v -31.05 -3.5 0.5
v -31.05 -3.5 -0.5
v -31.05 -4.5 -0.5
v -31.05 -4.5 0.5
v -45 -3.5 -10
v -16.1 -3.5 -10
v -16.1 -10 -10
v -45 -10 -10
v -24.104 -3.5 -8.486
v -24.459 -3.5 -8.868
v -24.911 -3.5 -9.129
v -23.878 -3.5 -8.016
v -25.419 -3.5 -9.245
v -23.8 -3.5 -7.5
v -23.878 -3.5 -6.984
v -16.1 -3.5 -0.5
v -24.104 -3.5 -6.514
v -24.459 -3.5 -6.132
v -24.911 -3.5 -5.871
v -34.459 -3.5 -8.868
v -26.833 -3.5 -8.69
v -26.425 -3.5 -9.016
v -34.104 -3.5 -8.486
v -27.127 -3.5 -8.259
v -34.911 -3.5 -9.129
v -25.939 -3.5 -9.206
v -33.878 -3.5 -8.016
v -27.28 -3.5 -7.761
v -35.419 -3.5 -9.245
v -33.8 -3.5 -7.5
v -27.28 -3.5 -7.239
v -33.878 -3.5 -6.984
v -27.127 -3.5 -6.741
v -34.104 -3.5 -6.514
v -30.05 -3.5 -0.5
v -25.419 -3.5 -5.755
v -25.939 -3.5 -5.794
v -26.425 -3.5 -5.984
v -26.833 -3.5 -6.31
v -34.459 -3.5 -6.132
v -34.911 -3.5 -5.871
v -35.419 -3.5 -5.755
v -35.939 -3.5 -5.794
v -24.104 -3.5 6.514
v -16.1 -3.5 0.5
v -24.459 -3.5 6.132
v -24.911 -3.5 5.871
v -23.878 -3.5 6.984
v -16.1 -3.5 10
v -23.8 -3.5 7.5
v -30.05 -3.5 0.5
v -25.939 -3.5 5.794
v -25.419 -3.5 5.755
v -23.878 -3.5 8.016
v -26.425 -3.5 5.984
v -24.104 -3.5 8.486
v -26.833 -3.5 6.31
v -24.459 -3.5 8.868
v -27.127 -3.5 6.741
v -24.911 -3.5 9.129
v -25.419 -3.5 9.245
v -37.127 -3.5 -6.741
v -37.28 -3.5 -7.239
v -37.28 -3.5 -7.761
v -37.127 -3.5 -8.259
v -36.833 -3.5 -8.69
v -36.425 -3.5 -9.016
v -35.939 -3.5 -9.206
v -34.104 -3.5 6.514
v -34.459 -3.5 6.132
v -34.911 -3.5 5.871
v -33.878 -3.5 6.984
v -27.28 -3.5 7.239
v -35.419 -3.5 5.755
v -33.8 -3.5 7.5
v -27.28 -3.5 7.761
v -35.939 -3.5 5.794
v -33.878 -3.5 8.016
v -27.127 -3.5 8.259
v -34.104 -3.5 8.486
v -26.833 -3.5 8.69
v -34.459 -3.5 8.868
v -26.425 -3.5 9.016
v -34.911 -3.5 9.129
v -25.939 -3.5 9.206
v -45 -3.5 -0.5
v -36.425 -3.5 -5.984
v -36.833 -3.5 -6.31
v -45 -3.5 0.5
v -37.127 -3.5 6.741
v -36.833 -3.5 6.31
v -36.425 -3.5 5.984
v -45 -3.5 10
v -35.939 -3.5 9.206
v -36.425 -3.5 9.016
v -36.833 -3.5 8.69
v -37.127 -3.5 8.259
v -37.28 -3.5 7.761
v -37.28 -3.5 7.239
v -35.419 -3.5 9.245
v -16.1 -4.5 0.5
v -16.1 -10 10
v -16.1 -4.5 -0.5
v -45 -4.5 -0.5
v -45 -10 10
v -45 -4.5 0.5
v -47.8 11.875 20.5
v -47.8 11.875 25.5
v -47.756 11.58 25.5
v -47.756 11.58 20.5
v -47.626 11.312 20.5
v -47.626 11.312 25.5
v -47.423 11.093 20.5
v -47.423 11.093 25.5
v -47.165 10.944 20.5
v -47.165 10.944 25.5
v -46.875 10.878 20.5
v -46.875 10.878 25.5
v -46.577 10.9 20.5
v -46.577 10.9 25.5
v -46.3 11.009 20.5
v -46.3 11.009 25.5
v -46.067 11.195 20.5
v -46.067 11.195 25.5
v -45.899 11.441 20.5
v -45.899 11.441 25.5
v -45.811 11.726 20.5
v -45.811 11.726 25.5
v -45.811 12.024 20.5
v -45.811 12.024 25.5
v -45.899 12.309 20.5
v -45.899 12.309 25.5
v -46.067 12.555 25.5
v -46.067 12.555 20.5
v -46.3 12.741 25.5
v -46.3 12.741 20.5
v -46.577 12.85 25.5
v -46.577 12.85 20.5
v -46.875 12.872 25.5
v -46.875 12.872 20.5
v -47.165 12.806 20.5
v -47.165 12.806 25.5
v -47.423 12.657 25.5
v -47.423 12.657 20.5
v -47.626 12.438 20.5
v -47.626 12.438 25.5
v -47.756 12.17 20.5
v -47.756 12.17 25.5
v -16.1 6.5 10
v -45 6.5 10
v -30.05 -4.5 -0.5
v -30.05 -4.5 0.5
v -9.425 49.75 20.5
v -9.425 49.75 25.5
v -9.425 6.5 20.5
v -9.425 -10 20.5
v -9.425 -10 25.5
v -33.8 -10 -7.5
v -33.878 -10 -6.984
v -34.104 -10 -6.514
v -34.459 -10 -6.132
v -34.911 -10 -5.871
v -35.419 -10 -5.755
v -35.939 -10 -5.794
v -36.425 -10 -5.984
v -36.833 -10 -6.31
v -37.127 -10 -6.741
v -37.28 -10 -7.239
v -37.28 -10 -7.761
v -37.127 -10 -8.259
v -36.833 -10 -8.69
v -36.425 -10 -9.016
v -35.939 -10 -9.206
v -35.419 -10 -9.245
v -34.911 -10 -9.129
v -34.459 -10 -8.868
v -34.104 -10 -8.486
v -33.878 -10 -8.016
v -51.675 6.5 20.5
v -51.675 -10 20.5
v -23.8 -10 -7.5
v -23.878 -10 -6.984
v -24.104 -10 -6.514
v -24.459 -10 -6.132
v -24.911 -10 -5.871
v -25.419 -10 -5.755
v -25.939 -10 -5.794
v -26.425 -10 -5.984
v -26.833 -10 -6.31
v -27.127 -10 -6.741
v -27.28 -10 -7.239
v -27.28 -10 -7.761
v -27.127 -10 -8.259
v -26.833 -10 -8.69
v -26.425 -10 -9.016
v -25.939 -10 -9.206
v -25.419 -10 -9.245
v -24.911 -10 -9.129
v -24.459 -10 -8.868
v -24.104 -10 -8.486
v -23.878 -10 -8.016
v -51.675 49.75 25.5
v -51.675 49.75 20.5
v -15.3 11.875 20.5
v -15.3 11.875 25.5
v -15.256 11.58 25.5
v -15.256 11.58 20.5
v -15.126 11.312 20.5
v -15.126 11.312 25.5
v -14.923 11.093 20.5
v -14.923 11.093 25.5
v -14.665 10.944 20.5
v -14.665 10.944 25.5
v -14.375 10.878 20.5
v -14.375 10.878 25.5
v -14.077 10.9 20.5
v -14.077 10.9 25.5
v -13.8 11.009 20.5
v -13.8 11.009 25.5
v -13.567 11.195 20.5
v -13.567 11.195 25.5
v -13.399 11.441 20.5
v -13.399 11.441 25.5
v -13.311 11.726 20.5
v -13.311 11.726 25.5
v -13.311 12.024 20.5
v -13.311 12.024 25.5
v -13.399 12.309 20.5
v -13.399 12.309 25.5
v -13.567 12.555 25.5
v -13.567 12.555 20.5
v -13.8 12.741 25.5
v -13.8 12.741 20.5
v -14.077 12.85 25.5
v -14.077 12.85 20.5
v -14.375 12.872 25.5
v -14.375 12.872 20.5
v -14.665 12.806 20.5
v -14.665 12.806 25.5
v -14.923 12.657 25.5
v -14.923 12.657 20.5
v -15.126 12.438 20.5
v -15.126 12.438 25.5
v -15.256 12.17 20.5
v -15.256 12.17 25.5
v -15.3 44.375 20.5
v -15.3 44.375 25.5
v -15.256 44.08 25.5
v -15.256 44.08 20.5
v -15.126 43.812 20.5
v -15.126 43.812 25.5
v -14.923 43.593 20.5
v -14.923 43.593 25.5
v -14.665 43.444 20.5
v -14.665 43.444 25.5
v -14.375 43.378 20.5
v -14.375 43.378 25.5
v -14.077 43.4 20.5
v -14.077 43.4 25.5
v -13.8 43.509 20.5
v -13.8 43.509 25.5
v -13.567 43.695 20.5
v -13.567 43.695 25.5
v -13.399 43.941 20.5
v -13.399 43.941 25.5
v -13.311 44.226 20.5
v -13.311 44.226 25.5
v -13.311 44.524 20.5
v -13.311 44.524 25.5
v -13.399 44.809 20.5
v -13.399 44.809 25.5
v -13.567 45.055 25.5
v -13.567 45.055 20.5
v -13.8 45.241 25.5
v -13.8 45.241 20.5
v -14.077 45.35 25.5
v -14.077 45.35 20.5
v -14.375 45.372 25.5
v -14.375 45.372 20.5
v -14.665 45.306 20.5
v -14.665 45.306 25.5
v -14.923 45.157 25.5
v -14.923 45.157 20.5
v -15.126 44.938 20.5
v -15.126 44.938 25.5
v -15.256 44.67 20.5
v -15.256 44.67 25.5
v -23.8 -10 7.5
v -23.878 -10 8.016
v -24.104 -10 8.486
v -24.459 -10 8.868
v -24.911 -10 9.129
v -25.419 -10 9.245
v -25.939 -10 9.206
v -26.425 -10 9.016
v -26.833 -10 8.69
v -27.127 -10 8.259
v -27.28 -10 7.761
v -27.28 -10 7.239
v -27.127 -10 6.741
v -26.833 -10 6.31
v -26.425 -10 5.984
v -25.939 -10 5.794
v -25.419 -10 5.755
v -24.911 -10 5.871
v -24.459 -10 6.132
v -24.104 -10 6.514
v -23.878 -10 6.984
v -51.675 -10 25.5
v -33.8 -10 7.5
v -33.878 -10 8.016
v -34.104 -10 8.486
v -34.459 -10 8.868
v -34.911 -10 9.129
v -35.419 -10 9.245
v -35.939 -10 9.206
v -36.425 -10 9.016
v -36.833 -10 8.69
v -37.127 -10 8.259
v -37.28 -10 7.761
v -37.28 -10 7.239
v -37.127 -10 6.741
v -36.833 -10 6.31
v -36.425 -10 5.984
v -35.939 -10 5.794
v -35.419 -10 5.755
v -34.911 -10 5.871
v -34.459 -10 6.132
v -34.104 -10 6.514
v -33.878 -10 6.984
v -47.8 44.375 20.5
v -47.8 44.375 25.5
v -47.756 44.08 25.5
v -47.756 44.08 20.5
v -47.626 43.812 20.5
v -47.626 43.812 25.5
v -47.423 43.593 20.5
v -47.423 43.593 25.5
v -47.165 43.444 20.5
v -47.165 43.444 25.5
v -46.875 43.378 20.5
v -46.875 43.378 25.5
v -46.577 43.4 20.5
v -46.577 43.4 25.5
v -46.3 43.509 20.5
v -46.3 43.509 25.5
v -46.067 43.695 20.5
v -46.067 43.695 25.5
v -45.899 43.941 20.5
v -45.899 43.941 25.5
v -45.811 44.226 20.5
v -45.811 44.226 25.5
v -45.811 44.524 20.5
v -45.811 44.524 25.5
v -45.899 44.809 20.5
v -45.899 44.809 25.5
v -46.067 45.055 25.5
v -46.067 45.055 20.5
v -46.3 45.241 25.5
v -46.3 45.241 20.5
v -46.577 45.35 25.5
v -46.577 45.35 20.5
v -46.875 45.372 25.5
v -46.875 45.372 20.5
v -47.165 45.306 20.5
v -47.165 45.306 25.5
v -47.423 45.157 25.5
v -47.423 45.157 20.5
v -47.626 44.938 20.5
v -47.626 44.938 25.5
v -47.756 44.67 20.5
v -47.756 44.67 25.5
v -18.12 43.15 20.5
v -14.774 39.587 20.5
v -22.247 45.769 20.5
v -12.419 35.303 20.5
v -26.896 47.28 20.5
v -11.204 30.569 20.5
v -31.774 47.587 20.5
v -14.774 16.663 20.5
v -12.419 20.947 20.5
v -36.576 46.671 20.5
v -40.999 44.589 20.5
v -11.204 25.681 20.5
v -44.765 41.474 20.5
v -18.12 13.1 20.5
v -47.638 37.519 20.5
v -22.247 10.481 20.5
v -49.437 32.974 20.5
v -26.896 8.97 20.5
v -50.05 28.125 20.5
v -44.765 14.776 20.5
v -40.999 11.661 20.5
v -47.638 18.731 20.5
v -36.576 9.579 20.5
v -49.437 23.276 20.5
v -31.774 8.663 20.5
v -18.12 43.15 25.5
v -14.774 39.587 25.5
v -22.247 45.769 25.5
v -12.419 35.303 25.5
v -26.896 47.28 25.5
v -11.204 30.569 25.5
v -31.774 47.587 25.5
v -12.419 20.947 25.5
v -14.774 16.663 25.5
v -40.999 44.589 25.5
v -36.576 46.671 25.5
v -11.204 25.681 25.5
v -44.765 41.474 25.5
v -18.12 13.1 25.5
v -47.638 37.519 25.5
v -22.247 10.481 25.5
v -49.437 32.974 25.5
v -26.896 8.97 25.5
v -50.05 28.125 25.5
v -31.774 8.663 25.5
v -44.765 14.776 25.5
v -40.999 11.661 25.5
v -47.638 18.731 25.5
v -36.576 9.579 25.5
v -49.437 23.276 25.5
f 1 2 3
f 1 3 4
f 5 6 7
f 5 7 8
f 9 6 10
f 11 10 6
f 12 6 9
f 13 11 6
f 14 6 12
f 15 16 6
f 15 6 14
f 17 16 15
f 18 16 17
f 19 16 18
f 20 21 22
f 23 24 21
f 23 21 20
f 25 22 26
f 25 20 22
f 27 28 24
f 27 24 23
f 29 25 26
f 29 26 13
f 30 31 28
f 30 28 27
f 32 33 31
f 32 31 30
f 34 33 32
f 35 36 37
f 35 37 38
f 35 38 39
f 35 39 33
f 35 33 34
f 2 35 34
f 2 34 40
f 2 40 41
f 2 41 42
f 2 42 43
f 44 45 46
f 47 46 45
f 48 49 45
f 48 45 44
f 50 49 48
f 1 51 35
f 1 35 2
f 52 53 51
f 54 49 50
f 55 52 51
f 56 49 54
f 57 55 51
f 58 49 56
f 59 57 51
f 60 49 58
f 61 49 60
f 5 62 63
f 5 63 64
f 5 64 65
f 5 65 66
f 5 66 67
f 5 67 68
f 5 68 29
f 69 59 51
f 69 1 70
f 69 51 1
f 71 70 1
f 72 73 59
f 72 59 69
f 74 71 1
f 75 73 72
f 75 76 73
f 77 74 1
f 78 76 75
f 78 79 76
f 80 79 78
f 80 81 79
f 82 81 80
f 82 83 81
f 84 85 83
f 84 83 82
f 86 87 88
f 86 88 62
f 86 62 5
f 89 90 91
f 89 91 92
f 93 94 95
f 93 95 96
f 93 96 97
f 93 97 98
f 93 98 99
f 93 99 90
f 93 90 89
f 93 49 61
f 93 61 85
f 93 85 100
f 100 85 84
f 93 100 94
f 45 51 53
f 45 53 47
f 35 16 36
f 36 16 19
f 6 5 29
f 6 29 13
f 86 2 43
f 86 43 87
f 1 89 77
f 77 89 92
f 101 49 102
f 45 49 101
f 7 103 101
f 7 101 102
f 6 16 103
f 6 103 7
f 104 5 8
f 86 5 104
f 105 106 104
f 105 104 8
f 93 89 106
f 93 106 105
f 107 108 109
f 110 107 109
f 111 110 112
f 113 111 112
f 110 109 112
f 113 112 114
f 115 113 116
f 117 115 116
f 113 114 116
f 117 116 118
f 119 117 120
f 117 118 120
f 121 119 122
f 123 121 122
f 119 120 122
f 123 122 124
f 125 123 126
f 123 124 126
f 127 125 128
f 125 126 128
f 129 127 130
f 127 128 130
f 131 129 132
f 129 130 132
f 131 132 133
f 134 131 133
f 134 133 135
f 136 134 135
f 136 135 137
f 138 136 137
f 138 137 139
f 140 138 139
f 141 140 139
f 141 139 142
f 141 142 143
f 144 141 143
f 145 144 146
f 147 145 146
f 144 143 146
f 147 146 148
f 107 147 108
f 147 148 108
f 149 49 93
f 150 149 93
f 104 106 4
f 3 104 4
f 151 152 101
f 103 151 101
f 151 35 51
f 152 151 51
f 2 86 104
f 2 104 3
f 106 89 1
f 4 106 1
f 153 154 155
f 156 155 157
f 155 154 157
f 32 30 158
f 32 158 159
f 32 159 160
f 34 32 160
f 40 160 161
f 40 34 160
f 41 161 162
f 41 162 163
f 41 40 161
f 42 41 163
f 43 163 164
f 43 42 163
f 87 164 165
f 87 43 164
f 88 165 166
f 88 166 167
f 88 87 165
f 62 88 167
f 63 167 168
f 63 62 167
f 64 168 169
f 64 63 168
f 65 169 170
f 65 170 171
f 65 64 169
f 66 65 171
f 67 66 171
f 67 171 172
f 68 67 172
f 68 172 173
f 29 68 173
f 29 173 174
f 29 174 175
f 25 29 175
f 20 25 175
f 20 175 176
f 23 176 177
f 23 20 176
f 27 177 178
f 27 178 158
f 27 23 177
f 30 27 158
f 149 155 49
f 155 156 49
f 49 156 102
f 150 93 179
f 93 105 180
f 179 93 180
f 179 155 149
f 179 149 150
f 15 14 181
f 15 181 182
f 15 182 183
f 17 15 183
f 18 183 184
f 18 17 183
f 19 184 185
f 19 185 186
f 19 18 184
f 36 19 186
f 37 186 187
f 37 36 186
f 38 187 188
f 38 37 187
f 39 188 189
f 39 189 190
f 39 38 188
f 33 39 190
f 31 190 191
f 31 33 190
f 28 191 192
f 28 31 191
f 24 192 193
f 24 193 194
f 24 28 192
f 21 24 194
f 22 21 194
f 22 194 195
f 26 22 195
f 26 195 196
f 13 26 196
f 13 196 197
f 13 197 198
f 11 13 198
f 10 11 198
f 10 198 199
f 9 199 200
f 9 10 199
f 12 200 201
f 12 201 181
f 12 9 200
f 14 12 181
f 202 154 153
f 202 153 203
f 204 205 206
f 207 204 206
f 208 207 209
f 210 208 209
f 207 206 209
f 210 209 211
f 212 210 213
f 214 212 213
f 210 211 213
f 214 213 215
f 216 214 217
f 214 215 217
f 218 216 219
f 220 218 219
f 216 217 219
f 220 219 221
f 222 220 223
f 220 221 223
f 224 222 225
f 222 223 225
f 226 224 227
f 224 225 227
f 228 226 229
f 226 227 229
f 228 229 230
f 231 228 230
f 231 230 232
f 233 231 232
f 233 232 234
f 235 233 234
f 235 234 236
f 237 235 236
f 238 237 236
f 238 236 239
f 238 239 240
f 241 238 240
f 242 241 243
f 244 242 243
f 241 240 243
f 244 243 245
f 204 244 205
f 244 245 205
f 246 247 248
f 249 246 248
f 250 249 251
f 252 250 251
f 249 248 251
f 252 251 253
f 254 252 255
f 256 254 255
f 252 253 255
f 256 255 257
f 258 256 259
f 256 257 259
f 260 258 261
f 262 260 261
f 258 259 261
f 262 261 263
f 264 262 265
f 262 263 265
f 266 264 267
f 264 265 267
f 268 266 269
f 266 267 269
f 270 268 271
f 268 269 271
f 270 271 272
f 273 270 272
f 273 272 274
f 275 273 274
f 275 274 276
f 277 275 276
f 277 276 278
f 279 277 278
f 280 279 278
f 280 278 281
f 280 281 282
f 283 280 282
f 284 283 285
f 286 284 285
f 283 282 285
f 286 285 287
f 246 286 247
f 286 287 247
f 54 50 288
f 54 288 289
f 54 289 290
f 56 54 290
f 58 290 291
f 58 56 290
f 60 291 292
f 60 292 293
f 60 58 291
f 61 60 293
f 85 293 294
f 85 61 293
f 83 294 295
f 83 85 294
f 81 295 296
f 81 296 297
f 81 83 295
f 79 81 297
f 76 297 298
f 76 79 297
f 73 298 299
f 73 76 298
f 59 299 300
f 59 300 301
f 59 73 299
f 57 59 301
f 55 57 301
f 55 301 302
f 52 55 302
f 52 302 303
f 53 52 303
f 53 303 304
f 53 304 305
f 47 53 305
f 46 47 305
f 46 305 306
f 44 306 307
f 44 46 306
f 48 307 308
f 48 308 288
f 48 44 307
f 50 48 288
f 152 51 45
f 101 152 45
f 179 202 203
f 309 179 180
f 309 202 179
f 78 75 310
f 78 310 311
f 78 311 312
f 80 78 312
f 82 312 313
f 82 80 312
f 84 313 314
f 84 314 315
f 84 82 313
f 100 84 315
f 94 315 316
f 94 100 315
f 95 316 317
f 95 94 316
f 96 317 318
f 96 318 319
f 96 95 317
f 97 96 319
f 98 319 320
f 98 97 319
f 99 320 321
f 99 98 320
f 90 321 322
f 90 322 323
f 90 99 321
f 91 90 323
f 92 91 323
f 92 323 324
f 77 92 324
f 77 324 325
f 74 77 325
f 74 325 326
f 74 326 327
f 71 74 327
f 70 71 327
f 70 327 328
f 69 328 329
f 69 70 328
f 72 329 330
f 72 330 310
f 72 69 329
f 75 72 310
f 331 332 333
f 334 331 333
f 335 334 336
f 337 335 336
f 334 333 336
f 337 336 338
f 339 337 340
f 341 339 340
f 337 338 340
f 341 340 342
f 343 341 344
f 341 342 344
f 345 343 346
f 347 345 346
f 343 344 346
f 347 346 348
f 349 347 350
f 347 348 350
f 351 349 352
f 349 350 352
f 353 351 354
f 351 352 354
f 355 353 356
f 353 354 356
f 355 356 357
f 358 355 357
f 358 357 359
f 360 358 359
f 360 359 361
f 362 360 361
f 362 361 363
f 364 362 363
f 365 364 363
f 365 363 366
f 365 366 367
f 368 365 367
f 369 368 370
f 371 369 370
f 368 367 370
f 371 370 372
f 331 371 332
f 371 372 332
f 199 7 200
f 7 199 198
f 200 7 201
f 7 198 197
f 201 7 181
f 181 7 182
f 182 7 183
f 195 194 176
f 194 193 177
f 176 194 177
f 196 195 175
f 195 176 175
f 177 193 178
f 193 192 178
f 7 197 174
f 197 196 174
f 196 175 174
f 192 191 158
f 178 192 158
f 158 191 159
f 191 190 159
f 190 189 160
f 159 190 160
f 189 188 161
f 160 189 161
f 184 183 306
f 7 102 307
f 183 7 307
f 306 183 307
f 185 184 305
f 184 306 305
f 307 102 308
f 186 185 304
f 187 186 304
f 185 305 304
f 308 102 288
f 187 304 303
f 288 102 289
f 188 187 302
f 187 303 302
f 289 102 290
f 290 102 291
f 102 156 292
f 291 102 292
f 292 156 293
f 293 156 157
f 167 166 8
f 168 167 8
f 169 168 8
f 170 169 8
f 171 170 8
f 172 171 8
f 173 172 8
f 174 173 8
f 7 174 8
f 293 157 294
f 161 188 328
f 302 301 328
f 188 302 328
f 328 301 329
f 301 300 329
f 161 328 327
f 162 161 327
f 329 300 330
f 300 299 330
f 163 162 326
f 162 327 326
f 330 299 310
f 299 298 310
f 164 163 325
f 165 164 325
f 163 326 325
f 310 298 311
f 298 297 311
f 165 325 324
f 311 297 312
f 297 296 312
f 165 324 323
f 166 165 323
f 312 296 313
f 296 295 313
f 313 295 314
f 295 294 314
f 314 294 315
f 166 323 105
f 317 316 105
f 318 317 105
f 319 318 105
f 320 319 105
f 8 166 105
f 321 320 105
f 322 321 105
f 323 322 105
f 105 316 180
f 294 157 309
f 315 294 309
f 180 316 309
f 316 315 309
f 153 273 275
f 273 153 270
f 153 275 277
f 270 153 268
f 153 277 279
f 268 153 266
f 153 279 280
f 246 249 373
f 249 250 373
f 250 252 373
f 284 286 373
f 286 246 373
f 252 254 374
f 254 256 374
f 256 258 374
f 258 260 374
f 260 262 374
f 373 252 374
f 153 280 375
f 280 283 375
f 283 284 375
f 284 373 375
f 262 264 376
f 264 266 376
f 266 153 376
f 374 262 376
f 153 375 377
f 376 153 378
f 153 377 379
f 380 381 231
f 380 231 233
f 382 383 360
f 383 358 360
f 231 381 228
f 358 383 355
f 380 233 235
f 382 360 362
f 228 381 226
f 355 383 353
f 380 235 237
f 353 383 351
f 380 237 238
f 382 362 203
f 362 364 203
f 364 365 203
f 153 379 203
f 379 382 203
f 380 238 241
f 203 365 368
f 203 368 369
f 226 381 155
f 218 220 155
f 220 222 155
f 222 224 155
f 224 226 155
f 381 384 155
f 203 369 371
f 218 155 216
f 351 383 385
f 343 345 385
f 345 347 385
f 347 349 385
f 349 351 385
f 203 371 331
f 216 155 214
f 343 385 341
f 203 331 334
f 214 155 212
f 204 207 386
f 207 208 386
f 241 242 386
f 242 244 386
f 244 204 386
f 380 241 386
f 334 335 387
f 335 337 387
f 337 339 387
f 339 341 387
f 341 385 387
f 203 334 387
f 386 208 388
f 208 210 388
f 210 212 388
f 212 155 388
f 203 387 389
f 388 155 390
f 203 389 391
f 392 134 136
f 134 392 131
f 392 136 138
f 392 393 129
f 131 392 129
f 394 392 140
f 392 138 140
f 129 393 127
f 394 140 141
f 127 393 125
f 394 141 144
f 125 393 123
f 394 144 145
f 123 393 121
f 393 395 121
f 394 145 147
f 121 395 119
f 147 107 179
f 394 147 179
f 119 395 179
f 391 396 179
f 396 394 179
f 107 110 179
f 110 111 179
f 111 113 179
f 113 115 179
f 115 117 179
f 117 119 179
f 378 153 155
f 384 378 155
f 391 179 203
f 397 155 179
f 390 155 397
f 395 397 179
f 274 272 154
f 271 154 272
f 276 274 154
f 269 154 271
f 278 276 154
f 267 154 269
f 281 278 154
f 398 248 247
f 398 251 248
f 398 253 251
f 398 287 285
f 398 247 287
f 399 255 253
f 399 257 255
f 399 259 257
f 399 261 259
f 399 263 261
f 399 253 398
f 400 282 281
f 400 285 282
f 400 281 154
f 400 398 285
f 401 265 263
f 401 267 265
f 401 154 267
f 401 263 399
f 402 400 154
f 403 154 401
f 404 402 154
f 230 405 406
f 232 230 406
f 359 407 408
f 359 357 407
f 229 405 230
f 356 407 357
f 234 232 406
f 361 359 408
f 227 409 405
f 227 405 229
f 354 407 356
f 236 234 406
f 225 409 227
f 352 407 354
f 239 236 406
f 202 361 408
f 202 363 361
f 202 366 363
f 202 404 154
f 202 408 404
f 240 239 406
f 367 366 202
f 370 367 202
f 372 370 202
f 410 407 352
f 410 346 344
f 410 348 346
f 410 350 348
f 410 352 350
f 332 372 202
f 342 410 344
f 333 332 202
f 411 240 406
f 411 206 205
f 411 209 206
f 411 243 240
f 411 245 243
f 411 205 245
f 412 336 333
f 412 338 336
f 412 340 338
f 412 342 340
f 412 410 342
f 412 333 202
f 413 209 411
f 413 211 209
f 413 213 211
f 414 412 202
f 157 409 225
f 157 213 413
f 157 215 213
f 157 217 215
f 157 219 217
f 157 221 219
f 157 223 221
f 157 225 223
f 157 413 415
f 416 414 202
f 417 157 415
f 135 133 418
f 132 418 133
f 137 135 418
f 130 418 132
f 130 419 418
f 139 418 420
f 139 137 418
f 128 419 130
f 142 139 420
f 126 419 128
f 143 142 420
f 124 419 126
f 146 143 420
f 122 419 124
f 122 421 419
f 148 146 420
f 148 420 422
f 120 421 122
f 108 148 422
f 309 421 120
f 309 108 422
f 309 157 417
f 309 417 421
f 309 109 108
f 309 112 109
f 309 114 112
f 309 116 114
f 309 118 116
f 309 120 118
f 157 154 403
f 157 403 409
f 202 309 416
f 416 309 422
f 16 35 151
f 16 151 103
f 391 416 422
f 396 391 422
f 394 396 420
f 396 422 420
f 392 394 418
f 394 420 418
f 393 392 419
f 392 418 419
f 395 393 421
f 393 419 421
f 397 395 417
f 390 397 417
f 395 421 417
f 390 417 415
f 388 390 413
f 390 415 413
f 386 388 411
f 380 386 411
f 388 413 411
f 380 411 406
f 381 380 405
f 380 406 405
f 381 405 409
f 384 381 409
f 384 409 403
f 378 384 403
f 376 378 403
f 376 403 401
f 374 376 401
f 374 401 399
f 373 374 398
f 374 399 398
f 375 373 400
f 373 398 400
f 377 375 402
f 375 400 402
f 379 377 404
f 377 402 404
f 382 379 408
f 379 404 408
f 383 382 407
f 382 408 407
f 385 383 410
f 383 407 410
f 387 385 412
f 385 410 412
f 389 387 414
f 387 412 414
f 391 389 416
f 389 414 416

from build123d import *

# Parameters (mm, degrees)
SKETCH010_R     = 1.75
PAD005_DEPTH    = 6.5
PAD006_DEPTH    = 10
SKETCH012_R     = 3
POCKET004_DEPTH = 14.45
SKETCH013_W     = 42.25
SKETCH013_H     = 43.25
SKETCH013_R     = 19.5
SKETCH013_R_2   = 1
PAD007_DEPTH    = 5
SKETCH054_W     = 13.95
SKETCH054_H     = 1
POCKET023_DEPTH = 1


with BuildPart() as part:
    # Sketch010 → Pad005 (new body)
    with BuildSketch(Plane.XZ):
        Polygon((14.45, 10), (14.45, -10), (-14.45, -10), (-14.45, 10), (-21.125, 20.5), (-21.125, 25.5), (21.125, 25.5), (21.125, 20.5), align=None)
        with Locations((-5, 7.5)):
            Circle(SKETCH010_R, mode=Mode.SUBTRACT)
        with Locations((5, 7.5)):
            Circle(SKETCH010_R, mode=Mode.SUBTRACT)
        with Locations((-5, -7.5)):
            Circle(SKETCH010_R, mode=Mode.SUBTRACT)
        with Locations((5, -7.5)):
            Circle(SKETCH010_R, mode=Mode.SUBTRACT)
    extrude(amount=PAD005_DEPTH)

    # Sketch011 → Pad006 (join)
    with BuildSketch(Plane.XZ):
        Polygon((-21.125, 25.5), (21.125, 25.5), (21.125, 20.5), (14.45, 10), (-14.45, 10), (-21.125, 20.5), align=None)
    extrude(amount=-PAD006_DEPTH)

    # Sketch012 → Pocket004 (cut, symmetric)
    with BuildSketch(Plane.YZ):
        with Locations((5, -14.5)):
            Circle(SKETCH012_R)
    extrude(amount=POCKET004_DEPTH, both=True, mode=Mode.SUBTRACT)

    # Sketch013 (on Face9 of Pocket004) → Pad007 (join)
    with BuildSketch(Plane(origin=(0, 0, 25.5), x_dir=(-1, 0, 0), z_dir=(0, 0, 1))):
        with Locations((0, -31.625)):
            Rectangle(SKETCH013_W, SKETCH013_H)
        with Locations((0, -31.625)):
            Circle(SKETCH013_R, mode=Mode.SUBTRACT)
        with Locations((-16.25, -15.375)):
            Circle(SKETCH013_R_2, mode=Mode.SUBTRACT)
        with Locations((16.25, -15.375)):
            Circle(SKETCH013_R_2, mode=Mode.SUBTRACT)
        with Locations((16.25, -47.875)):
            Circle(SKETCH013_R_2, mode=Mode.SUBTRACT)
        with Locations((-16.25, -47.875)):
            Circle(SKETCH013_R_2, mode=Mode.SUBTRACT)
    extrude(amount=-PAD007_DEPTH)

    # Sketch054 → Pocket023 (cut)
    with BuildSketch(Plane.XZ):
        with Locations((-7.475, 0)):
            Rectangle(SKETCH054_W, SKETCH054_H)
        with Locations((7.475, 0)):
            Rectangle(SKETCH054_W, SKETCH054_H)
    extrude(amount=POCKET023_DEPTH, mode=Mode.SUBTRACT)


with BuildPart() as part_1:
    # Body003 placement: moved
    add(part.part.moved(Location((-30.55, -3.5, 0))))


solid = part_1.part
